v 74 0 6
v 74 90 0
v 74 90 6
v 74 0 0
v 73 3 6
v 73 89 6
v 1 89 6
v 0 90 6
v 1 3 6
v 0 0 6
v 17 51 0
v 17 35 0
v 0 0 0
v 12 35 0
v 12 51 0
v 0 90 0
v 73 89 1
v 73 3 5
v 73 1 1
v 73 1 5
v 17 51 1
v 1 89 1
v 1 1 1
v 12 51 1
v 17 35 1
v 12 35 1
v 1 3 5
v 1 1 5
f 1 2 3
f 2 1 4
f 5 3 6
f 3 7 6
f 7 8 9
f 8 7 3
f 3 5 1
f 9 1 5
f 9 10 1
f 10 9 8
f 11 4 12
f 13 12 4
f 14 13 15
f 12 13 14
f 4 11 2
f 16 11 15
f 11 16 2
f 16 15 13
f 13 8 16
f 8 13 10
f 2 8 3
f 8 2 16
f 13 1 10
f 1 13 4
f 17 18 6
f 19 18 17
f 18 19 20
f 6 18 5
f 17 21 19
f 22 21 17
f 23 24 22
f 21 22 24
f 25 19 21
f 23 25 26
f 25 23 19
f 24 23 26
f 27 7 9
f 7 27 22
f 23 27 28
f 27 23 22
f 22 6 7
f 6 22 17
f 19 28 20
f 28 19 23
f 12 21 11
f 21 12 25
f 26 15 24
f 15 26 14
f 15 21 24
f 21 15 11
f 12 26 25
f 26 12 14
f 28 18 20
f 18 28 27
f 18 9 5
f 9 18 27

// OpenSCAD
difference() {
    cube([74,90,6]);
    
    translate([1,1,1]) {
        cube([72,88,10]);
    }
    translate([12, 35, -2]) {
        cube([5, 16, 10]);
    }
}

translate([0,0,5]) {
    cube([74, 3, 1]);
}
